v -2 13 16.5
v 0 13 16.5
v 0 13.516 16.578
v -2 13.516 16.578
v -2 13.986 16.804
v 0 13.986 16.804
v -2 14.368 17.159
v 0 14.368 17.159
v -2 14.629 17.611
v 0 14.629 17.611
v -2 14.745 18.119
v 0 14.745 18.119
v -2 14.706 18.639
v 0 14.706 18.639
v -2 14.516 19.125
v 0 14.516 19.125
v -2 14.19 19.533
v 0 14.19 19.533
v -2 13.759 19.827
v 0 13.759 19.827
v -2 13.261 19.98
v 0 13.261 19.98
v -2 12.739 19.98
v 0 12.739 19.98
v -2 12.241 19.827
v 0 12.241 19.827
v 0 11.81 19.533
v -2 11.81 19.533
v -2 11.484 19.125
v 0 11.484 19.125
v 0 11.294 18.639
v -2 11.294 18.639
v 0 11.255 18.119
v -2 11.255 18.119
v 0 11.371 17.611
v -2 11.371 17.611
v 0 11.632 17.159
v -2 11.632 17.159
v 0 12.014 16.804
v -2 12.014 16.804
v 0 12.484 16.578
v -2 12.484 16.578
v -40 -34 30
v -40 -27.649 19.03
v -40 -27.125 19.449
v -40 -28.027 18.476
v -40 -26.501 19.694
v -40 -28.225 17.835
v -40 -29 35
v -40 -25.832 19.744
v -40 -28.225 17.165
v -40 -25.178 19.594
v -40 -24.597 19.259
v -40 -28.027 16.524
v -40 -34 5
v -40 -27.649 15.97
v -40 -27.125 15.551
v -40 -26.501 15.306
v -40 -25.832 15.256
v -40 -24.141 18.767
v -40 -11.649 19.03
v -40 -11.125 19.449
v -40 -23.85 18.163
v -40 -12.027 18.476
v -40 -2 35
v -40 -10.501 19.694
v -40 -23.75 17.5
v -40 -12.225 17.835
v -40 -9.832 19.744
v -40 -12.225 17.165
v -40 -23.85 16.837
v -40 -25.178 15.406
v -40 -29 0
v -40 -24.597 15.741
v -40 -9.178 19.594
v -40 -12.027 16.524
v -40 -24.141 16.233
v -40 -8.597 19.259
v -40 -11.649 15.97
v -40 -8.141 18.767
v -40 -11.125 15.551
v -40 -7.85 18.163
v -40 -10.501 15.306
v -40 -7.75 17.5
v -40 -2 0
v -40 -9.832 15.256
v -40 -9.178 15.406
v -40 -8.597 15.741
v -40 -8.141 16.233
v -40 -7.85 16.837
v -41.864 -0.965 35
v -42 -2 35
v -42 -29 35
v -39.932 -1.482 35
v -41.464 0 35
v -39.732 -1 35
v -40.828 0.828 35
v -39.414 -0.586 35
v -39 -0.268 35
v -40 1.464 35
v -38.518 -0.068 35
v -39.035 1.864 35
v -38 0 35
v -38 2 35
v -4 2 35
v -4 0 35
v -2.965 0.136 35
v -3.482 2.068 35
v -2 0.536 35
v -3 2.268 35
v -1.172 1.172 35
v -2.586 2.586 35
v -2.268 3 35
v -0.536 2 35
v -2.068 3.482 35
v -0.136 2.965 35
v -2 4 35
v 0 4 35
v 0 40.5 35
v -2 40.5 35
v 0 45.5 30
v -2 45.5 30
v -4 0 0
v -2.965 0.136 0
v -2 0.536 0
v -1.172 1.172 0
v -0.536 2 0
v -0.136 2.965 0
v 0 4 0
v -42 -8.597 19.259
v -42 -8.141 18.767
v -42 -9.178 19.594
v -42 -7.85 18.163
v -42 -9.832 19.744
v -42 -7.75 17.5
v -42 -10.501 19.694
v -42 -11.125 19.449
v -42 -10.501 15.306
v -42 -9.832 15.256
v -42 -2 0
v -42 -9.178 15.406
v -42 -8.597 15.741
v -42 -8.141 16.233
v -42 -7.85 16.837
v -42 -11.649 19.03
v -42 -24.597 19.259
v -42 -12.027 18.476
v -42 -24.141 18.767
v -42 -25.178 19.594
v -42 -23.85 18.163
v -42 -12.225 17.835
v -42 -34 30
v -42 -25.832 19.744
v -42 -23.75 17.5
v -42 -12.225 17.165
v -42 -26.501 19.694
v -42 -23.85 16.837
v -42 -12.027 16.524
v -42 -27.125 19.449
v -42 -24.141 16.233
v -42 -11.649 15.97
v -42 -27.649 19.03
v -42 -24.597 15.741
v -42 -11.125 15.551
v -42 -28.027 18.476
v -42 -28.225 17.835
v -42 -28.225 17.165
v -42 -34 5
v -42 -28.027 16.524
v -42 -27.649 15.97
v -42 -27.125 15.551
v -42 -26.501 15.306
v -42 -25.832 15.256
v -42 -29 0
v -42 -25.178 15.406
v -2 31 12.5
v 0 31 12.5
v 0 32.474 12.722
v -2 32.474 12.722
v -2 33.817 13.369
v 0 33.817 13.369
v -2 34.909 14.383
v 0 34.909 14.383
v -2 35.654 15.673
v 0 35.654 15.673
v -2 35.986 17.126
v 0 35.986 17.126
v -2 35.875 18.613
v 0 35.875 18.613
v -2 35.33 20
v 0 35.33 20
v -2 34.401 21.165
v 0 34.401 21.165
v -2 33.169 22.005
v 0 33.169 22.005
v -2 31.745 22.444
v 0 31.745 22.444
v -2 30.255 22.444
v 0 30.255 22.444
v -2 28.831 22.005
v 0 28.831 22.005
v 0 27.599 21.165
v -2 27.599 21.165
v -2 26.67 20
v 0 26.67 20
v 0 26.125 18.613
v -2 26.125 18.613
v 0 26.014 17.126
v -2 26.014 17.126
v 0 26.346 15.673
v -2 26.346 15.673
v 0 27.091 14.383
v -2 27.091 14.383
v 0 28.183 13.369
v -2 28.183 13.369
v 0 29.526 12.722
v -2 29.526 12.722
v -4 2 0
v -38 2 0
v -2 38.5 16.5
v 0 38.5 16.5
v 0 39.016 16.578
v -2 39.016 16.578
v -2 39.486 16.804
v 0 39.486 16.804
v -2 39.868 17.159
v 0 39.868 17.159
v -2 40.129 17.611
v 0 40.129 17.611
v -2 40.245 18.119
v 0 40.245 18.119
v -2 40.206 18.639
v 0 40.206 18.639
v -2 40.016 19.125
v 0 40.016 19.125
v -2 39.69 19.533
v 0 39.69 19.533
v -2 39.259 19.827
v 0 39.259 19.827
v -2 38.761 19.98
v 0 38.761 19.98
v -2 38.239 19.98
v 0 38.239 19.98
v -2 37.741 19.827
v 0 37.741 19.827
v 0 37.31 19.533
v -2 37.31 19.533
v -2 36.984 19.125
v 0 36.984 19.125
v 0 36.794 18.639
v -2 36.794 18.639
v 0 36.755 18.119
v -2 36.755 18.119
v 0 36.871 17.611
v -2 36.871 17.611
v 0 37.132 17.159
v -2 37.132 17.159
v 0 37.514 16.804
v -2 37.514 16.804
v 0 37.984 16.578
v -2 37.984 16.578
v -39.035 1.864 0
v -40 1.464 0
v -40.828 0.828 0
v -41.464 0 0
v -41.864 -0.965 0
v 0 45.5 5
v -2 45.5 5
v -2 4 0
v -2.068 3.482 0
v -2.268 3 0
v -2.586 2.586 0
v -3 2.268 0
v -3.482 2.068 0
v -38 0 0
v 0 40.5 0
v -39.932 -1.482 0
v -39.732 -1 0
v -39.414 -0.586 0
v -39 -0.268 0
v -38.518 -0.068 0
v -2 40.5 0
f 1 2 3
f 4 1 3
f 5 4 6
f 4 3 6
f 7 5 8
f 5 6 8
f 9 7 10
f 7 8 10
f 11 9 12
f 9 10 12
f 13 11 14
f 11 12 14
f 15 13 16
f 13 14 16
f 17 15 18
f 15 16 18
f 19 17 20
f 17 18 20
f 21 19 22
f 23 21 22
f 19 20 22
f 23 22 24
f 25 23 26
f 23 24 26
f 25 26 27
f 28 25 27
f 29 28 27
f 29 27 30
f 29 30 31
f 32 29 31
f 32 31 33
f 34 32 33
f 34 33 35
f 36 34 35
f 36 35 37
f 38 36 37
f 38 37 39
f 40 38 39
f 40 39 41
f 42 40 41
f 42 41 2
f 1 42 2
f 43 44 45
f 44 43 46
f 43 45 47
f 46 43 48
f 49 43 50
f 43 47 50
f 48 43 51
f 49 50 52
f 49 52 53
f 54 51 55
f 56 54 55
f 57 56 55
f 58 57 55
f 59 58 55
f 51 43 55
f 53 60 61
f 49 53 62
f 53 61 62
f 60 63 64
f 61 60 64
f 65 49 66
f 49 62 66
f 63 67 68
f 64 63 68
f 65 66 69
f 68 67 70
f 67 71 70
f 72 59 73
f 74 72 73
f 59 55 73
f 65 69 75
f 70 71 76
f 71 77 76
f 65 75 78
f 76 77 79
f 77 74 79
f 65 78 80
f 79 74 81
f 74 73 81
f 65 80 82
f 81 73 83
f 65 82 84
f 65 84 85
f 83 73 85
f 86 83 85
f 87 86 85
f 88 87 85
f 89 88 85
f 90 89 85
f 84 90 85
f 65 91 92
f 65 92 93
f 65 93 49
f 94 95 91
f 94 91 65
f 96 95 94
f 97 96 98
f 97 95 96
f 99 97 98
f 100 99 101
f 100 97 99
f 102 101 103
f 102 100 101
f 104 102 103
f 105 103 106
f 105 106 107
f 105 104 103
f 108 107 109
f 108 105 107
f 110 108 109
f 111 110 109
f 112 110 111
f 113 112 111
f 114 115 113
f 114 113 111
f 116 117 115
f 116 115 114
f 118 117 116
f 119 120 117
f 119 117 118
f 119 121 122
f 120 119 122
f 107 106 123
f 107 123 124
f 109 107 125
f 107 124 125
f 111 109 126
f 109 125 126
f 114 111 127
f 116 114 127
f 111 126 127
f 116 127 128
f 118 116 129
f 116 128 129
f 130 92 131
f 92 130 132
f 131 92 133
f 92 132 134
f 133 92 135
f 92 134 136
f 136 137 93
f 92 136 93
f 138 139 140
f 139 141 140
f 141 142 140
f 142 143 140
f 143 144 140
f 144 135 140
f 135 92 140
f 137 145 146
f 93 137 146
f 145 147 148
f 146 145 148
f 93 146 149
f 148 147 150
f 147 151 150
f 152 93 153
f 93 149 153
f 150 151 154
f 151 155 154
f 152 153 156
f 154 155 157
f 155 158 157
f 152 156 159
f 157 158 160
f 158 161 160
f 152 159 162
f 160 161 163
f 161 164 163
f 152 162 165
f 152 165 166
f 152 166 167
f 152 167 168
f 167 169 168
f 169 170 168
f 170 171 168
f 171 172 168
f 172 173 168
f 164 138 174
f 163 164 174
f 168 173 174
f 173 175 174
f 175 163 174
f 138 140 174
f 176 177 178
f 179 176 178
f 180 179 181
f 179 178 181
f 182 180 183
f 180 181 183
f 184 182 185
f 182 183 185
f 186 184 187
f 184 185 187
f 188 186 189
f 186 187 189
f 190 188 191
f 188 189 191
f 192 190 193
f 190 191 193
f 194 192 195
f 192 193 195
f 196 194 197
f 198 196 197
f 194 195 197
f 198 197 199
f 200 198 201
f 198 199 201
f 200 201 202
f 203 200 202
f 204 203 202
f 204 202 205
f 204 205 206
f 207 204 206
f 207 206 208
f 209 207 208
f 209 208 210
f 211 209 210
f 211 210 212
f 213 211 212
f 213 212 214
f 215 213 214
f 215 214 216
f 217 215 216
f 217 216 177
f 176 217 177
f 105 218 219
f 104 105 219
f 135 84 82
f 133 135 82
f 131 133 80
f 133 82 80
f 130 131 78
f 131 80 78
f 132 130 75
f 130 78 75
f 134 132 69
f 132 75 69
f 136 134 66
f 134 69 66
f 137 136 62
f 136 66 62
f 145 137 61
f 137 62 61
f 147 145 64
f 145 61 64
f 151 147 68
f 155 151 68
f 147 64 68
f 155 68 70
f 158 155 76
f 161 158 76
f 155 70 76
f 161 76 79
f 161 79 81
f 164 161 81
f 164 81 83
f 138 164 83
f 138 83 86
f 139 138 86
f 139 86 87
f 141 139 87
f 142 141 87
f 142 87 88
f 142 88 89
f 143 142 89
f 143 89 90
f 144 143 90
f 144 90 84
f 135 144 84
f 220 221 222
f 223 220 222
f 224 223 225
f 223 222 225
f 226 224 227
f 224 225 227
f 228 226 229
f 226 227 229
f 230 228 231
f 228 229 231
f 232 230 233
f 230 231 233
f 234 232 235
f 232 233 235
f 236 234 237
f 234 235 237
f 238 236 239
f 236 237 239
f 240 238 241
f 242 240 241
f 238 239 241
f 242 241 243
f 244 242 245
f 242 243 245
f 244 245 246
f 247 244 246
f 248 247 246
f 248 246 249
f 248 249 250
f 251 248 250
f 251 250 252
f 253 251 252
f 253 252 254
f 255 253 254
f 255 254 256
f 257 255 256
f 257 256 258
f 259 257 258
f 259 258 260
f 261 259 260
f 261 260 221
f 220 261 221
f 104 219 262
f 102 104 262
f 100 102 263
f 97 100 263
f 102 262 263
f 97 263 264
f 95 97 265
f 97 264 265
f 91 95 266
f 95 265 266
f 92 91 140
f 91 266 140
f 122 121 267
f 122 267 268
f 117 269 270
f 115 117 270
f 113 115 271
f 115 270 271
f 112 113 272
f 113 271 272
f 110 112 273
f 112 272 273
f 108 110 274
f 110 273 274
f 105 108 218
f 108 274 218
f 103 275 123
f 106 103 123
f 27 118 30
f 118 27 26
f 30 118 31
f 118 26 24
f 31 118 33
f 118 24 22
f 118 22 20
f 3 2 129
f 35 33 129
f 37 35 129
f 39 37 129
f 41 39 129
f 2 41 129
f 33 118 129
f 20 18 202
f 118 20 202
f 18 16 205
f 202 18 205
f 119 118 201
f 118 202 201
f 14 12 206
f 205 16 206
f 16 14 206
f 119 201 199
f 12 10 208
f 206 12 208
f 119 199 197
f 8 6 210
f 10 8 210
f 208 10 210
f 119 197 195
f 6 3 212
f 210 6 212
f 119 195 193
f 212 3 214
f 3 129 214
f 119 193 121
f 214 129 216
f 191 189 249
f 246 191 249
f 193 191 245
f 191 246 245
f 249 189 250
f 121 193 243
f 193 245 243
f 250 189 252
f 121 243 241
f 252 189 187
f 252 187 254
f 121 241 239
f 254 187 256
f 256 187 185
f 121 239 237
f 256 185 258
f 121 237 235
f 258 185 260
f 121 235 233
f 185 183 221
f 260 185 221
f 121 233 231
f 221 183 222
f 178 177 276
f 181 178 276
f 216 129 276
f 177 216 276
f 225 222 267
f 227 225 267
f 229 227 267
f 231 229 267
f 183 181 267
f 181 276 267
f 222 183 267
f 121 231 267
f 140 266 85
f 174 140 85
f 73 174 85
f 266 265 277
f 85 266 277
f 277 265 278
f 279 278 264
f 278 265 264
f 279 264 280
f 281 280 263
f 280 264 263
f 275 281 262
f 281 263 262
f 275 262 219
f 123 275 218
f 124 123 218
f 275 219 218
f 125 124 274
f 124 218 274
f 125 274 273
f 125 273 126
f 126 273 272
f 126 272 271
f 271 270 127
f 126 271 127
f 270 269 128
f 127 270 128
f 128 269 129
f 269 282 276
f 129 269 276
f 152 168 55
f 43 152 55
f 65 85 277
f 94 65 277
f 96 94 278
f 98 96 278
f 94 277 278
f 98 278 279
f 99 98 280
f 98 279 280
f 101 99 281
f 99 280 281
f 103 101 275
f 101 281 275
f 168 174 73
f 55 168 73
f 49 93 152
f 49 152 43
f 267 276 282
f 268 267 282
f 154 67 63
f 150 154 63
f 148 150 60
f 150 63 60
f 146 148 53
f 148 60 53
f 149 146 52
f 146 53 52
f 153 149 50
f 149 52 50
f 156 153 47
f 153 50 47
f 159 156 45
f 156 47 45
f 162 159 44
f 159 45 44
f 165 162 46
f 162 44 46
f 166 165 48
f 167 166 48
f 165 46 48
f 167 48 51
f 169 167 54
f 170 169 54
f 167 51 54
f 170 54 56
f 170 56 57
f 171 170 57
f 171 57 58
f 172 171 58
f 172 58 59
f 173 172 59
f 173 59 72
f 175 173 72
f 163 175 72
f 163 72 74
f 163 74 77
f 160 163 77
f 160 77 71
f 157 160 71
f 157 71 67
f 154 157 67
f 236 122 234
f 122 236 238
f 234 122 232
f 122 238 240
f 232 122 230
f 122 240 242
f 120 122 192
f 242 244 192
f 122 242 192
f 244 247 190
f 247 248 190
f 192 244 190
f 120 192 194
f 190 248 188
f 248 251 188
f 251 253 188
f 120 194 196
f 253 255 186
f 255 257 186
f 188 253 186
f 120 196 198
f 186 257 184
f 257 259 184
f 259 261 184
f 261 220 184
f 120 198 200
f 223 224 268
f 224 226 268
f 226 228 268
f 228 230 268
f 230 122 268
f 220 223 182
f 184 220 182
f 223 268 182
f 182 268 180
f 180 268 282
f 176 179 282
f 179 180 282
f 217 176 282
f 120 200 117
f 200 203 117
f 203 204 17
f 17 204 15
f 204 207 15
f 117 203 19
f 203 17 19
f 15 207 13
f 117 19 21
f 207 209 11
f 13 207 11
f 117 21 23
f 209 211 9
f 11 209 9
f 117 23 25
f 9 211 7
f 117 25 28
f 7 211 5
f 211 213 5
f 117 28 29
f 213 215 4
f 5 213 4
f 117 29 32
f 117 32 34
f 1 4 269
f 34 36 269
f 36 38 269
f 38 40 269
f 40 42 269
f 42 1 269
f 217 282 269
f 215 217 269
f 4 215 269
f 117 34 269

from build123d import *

# Parameters (mm, degrees)
BASE_FLANGE1_DEPTH = 35
SKETCH3_R          = 5
SKETCH3_R_2        = 1.75
CUT_EXTRUDE1_DEPTH = 10
CHAMFER1_SIZE      = 5
SKETCH4_R          = 2.25
CUT_EXTRUDE2_DEPTH = 10


# Sheet-metal steps are written as plain solids
with BuildPart() as part:
    # Sketch1 → Base-Flange1 (new body)
    with BuildSketch(Plane.XY):
        with BuildLine():
            Line((-40, -34), (-40, -2))
            ThreePointArc((-40, -2), (-39.414213562, -0.585786438), (-38, 0))
            Line((-38, 0), (-4, 0))
            ThreePointArc((-4, 0), (-1.171572875, 1.171572875), (0, 4))
            Line((0, 4), (0, 45.5))
            Line((0, 45.5), (-2, 45.5))
            Line((-2, 45.5), (-2, 4))
            ThreePointArc((-2, 4), (-2.585786438, 2.585786438), (-4, 2))
            Line((-4, 2), (-38, 2))
            ThreePointArc((-38, 2), (-40.828427125, 0.828427125), (-42, -2))
            Line((-42, -2), (-42, -34))
            Line((-42, -34), (-40, -34))
        make_face()
    extrude(amount=BASE_FLANGE1_DEPTH)

    # Sketch3 → Cut-Extrude1 (cut)
    with BuildSketch(Plane(origin=(0, 0, 0), x_dir=(0, 0, -1), z_dir=(1, 0, 0))):
        with Locations((-17.5, 31)):
            Circle(SKETCH3_R)
        with Locations((-18.25, 13)):
            Circle(SKETCH3_R_2)
        with Locations((-18.25, 38.5)):
            Circle(SKETCH3_R_2)
    extrude(amount=-CUT_EXTRUDE1_DEPTH, mode=Mode.SUBTRACT)

    # Chamfer1
    chamfer1_edges = [part.edges().sort_by_distance(p)[0] for p in [
        (-1, 45.5, 0),
        (-41, -34, 0),
        (-1, 45.5, 35),
        (-41, -34, 35),
    ]]
    chamfer(chamfer1_edges, length=CHAMFER1_SIZE)

    # Sketch4 → Cut-Extrude2 (cut)
    with BuildSketch(Plane(origin=(-40, 0, 0), x_dir=(0, 0, -1), z_dir=(1, 0, 0))):
        with Locations(Location((-17.5, -26, 0), (0, 0, 90))):
            Circle(SKETCH4_R)
        with Locations(Location((-17.5, -10, 0), (0, 0, 90))):
            Circle(SKETCH4_R)
    extrude(amount=-CUT_EXTRUDE2_DEPTH, mode=Mode.SUBTRACT)


solid = part.part
